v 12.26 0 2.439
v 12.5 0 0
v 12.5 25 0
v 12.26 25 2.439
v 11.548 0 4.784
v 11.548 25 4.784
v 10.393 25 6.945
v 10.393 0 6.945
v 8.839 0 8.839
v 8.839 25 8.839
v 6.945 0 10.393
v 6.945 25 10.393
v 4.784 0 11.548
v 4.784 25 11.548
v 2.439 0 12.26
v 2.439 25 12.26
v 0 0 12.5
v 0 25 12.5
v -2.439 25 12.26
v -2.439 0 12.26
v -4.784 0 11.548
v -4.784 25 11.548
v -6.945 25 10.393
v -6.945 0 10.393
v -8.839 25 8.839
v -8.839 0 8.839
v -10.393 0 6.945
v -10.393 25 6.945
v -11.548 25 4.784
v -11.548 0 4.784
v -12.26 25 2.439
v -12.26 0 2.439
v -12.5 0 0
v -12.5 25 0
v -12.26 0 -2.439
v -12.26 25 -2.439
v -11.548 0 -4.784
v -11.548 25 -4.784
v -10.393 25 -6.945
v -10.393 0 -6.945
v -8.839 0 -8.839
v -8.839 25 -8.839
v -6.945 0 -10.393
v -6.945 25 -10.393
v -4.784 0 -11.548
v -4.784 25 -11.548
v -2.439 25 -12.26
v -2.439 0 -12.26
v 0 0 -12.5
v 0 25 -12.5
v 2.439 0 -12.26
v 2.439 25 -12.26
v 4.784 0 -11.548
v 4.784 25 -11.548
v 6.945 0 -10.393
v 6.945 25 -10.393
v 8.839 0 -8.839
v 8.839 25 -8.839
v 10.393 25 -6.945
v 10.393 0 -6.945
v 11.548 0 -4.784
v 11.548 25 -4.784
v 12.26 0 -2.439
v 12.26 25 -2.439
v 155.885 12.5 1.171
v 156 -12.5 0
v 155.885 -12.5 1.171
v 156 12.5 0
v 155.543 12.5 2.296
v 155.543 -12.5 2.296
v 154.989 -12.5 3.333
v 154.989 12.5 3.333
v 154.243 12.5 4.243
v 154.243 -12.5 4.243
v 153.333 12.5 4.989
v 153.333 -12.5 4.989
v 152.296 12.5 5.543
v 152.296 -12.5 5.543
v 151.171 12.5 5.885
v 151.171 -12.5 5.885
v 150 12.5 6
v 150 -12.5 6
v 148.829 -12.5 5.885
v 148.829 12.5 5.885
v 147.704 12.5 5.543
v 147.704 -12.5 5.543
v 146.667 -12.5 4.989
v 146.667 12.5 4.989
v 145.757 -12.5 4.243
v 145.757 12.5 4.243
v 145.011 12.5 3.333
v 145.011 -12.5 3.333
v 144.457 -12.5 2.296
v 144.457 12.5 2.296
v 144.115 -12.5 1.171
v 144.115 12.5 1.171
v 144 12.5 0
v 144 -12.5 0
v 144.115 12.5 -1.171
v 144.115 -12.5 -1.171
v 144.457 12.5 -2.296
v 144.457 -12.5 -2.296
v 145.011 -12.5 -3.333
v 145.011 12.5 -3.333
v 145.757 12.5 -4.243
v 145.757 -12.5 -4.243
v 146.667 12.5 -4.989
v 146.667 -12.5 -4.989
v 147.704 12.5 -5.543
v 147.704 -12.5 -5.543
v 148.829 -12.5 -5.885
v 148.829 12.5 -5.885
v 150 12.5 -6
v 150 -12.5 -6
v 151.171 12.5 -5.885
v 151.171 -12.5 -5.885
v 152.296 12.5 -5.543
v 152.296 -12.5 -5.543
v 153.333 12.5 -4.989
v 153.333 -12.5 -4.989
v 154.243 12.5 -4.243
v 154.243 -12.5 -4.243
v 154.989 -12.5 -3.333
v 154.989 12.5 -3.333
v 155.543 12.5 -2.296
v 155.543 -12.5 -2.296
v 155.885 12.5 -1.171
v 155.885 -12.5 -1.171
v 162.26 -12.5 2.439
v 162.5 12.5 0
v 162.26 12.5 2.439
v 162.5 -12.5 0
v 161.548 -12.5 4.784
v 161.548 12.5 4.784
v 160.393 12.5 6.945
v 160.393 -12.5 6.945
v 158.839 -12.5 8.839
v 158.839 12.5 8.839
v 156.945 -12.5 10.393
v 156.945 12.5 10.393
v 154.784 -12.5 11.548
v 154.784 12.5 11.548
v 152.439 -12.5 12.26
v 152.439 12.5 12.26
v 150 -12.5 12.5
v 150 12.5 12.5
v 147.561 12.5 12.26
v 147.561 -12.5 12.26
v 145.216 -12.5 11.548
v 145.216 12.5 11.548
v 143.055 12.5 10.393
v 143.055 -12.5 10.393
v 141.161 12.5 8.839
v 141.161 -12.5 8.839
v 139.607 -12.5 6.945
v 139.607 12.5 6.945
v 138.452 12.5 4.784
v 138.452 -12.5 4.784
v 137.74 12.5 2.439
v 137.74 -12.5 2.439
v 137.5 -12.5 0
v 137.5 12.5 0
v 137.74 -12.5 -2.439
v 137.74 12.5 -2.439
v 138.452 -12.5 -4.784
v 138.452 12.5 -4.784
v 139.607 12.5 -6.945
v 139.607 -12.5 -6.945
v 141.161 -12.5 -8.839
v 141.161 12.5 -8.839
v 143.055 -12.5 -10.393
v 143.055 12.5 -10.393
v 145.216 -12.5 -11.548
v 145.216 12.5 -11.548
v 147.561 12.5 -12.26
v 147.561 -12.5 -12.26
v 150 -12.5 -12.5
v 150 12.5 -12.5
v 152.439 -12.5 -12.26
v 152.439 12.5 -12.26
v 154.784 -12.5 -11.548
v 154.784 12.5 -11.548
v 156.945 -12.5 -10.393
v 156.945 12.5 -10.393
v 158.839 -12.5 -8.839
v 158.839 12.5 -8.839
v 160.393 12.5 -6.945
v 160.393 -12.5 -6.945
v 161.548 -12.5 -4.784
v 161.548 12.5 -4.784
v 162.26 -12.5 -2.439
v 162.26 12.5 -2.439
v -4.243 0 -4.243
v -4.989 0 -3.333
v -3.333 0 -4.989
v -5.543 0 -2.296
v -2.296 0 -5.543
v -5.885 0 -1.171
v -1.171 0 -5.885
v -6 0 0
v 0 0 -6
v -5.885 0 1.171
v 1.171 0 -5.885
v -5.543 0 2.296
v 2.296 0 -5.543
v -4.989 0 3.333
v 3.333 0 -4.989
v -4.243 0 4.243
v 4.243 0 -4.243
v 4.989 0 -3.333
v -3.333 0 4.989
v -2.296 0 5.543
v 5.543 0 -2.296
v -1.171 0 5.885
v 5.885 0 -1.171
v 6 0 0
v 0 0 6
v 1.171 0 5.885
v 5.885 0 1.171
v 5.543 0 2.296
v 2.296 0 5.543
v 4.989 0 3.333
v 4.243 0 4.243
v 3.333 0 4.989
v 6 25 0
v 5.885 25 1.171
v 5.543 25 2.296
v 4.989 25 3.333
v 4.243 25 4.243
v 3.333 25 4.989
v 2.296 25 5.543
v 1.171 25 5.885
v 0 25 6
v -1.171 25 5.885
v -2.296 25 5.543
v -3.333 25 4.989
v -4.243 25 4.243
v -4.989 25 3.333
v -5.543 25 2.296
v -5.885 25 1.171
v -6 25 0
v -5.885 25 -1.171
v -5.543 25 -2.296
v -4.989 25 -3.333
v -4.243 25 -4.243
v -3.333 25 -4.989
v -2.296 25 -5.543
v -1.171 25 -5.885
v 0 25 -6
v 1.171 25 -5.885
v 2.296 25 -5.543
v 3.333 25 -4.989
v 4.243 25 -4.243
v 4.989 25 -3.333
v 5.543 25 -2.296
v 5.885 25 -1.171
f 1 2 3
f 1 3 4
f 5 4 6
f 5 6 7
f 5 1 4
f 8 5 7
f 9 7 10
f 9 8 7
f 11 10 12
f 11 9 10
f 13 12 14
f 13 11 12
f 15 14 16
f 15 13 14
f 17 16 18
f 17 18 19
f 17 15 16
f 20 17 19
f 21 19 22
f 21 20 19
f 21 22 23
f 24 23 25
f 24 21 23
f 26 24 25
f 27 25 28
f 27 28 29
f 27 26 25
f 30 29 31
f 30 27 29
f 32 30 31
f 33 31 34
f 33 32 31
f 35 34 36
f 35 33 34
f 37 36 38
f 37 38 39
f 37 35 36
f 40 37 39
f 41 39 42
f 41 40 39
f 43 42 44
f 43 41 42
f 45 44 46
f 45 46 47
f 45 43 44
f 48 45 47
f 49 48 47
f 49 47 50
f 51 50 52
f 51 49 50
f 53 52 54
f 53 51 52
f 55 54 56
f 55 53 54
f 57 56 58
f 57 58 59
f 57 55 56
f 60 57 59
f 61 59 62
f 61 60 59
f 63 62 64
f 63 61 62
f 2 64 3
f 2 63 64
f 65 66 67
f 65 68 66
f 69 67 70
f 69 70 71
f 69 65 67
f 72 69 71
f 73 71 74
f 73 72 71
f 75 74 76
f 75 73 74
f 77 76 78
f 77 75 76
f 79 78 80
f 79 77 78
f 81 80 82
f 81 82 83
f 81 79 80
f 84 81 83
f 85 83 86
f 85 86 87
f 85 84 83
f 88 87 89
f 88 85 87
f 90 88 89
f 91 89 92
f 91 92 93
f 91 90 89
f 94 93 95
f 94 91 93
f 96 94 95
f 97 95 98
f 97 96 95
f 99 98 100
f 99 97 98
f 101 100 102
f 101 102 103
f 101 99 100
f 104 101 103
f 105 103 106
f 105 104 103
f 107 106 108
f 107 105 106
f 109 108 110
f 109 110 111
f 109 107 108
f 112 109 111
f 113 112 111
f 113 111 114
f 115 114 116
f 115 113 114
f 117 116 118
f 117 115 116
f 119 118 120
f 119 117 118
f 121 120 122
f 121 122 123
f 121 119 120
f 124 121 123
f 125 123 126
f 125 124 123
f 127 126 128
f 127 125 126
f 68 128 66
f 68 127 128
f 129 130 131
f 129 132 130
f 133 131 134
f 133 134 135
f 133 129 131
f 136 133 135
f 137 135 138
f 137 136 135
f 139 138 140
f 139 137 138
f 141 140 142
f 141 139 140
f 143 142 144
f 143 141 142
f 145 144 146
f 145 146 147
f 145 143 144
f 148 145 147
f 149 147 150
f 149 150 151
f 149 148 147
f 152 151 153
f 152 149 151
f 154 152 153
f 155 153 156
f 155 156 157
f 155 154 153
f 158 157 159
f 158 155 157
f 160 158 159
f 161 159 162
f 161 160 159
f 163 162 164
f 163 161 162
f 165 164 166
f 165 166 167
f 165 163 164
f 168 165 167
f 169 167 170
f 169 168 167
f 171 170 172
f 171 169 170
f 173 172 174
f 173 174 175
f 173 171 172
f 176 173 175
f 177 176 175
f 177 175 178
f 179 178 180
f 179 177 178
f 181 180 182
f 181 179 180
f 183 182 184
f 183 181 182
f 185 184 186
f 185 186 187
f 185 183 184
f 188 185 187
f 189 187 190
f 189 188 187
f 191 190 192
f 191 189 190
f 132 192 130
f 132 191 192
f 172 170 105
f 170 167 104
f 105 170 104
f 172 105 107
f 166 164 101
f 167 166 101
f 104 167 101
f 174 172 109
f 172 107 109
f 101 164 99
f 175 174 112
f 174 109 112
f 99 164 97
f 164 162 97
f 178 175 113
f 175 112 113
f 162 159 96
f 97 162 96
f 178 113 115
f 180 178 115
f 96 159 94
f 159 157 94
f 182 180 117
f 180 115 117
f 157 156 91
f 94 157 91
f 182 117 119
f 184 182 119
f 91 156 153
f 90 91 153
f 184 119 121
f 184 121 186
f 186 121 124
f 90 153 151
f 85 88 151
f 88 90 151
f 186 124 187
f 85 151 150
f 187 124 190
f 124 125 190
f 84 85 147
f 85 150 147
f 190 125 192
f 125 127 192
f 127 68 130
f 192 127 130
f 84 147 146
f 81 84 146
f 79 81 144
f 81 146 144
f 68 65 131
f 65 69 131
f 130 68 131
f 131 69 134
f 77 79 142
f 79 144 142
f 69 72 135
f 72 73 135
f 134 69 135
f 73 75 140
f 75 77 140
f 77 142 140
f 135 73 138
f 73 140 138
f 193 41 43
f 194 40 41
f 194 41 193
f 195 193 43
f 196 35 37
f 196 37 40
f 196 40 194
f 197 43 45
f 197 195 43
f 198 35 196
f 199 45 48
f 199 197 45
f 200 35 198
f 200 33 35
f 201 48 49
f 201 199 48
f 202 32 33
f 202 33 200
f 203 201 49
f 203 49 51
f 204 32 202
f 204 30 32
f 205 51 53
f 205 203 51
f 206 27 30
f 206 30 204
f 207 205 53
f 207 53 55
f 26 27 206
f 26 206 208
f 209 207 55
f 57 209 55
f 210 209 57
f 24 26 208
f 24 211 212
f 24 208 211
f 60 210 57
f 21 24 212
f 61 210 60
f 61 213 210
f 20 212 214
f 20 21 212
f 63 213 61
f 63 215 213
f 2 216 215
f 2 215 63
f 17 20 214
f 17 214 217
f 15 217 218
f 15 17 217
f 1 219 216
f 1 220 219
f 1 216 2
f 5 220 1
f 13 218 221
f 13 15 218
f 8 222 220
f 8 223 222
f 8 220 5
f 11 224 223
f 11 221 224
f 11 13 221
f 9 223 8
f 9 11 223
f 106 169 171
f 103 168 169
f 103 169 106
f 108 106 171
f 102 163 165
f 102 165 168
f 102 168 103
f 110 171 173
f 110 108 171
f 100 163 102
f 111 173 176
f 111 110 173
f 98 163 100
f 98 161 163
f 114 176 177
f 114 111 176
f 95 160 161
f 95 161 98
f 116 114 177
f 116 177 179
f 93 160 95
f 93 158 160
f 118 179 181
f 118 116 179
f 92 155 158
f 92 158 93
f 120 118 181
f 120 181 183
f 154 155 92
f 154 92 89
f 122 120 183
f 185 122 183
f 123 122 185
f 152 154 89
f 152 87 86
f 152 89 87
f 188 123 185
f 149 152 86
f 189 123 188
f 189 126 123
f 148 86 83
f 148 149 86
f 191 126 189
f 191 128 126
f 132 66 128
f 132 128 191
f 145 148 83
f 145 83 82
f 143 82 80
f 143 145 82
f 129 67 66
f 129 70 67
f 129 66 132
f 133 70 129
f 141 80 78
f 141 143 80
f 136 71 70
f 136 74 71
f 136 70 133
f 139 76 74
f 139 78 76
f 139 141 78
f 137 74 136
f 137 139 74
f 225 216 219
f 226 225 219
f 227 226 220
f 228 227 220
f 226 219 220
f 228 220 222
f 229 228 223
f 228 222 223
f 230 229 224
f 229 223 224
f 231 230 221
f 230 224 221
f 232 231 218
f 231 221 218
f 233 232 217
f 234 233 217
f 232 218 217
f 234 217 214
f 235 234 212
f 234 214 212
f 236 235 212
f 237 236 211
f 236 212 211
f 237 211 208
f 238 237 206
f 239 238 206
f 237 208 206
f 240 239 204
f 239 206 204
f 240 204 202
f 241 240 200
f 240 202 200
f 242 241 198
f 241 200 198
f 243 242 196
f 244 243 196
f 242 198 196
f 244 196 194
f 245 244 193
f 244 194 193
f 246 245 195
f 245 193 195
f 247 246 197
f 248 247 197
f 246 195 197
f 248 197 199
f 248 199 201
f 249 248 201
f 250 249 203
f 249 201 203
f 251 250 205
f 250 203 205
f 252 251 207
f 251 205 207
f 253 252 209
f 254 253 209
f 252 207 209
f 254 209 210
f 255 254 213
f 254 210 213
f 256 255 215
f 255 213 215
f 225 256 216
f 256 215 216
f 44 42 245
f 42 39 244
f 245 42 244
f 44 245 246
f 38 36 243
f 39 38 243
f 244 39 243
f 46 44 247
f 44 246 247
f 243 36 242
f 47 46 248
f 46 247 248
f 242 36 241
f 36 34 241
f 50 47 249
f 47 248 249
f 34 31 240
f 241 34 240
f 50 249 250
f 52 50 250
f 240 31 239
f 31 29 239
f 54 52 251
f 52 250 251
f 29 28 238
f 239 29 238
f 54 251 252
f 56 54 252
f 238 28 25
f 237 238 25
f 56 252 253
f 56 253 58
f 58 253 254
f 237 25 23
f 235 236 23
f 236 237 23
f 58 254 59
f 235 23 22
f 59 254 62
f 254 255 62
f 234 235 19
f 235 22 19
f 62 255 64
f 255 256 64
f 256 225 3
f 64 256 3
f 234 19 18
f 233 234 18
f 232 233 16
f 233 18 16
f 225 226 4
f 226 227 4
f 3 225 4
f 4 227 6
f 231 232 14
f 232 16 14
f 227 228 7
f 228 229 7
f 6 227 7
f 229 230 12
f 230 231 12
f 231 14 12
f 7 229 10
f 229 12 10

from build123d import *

# Parameters (mm, degrees)
F0_R     = 12.5
F0_R_2   = 6
F1_DEPTH = 25
F2_R     = 12.5
F2_R_2   = 6
F3_DEPTH = 12.5


with BuildPart() as f1:
    # F0 (on Front) → F1 (new body)
    with BuildSketch(Plane.XZ):
        Circle(F0_R)
        Circle(F0_R_2, mode=Mode.SUBTRACT)
    extrude(amount=-F1_DEPTH)


with BuildPart() as f3:
    # F2 (on Front) → F3 (new body, symmetric)
    with BuildSketch(Plane.XZ):
        with Locations((150, 0)):
            Circle(F2_R)
        with Locations((150, 0)):
            Circle(F2_R_2, mode=Mode.SUBTRACT)
    extrude(amount=F3_DEPTH, both=True)


solid = Compound([f1.part, f3.part])
